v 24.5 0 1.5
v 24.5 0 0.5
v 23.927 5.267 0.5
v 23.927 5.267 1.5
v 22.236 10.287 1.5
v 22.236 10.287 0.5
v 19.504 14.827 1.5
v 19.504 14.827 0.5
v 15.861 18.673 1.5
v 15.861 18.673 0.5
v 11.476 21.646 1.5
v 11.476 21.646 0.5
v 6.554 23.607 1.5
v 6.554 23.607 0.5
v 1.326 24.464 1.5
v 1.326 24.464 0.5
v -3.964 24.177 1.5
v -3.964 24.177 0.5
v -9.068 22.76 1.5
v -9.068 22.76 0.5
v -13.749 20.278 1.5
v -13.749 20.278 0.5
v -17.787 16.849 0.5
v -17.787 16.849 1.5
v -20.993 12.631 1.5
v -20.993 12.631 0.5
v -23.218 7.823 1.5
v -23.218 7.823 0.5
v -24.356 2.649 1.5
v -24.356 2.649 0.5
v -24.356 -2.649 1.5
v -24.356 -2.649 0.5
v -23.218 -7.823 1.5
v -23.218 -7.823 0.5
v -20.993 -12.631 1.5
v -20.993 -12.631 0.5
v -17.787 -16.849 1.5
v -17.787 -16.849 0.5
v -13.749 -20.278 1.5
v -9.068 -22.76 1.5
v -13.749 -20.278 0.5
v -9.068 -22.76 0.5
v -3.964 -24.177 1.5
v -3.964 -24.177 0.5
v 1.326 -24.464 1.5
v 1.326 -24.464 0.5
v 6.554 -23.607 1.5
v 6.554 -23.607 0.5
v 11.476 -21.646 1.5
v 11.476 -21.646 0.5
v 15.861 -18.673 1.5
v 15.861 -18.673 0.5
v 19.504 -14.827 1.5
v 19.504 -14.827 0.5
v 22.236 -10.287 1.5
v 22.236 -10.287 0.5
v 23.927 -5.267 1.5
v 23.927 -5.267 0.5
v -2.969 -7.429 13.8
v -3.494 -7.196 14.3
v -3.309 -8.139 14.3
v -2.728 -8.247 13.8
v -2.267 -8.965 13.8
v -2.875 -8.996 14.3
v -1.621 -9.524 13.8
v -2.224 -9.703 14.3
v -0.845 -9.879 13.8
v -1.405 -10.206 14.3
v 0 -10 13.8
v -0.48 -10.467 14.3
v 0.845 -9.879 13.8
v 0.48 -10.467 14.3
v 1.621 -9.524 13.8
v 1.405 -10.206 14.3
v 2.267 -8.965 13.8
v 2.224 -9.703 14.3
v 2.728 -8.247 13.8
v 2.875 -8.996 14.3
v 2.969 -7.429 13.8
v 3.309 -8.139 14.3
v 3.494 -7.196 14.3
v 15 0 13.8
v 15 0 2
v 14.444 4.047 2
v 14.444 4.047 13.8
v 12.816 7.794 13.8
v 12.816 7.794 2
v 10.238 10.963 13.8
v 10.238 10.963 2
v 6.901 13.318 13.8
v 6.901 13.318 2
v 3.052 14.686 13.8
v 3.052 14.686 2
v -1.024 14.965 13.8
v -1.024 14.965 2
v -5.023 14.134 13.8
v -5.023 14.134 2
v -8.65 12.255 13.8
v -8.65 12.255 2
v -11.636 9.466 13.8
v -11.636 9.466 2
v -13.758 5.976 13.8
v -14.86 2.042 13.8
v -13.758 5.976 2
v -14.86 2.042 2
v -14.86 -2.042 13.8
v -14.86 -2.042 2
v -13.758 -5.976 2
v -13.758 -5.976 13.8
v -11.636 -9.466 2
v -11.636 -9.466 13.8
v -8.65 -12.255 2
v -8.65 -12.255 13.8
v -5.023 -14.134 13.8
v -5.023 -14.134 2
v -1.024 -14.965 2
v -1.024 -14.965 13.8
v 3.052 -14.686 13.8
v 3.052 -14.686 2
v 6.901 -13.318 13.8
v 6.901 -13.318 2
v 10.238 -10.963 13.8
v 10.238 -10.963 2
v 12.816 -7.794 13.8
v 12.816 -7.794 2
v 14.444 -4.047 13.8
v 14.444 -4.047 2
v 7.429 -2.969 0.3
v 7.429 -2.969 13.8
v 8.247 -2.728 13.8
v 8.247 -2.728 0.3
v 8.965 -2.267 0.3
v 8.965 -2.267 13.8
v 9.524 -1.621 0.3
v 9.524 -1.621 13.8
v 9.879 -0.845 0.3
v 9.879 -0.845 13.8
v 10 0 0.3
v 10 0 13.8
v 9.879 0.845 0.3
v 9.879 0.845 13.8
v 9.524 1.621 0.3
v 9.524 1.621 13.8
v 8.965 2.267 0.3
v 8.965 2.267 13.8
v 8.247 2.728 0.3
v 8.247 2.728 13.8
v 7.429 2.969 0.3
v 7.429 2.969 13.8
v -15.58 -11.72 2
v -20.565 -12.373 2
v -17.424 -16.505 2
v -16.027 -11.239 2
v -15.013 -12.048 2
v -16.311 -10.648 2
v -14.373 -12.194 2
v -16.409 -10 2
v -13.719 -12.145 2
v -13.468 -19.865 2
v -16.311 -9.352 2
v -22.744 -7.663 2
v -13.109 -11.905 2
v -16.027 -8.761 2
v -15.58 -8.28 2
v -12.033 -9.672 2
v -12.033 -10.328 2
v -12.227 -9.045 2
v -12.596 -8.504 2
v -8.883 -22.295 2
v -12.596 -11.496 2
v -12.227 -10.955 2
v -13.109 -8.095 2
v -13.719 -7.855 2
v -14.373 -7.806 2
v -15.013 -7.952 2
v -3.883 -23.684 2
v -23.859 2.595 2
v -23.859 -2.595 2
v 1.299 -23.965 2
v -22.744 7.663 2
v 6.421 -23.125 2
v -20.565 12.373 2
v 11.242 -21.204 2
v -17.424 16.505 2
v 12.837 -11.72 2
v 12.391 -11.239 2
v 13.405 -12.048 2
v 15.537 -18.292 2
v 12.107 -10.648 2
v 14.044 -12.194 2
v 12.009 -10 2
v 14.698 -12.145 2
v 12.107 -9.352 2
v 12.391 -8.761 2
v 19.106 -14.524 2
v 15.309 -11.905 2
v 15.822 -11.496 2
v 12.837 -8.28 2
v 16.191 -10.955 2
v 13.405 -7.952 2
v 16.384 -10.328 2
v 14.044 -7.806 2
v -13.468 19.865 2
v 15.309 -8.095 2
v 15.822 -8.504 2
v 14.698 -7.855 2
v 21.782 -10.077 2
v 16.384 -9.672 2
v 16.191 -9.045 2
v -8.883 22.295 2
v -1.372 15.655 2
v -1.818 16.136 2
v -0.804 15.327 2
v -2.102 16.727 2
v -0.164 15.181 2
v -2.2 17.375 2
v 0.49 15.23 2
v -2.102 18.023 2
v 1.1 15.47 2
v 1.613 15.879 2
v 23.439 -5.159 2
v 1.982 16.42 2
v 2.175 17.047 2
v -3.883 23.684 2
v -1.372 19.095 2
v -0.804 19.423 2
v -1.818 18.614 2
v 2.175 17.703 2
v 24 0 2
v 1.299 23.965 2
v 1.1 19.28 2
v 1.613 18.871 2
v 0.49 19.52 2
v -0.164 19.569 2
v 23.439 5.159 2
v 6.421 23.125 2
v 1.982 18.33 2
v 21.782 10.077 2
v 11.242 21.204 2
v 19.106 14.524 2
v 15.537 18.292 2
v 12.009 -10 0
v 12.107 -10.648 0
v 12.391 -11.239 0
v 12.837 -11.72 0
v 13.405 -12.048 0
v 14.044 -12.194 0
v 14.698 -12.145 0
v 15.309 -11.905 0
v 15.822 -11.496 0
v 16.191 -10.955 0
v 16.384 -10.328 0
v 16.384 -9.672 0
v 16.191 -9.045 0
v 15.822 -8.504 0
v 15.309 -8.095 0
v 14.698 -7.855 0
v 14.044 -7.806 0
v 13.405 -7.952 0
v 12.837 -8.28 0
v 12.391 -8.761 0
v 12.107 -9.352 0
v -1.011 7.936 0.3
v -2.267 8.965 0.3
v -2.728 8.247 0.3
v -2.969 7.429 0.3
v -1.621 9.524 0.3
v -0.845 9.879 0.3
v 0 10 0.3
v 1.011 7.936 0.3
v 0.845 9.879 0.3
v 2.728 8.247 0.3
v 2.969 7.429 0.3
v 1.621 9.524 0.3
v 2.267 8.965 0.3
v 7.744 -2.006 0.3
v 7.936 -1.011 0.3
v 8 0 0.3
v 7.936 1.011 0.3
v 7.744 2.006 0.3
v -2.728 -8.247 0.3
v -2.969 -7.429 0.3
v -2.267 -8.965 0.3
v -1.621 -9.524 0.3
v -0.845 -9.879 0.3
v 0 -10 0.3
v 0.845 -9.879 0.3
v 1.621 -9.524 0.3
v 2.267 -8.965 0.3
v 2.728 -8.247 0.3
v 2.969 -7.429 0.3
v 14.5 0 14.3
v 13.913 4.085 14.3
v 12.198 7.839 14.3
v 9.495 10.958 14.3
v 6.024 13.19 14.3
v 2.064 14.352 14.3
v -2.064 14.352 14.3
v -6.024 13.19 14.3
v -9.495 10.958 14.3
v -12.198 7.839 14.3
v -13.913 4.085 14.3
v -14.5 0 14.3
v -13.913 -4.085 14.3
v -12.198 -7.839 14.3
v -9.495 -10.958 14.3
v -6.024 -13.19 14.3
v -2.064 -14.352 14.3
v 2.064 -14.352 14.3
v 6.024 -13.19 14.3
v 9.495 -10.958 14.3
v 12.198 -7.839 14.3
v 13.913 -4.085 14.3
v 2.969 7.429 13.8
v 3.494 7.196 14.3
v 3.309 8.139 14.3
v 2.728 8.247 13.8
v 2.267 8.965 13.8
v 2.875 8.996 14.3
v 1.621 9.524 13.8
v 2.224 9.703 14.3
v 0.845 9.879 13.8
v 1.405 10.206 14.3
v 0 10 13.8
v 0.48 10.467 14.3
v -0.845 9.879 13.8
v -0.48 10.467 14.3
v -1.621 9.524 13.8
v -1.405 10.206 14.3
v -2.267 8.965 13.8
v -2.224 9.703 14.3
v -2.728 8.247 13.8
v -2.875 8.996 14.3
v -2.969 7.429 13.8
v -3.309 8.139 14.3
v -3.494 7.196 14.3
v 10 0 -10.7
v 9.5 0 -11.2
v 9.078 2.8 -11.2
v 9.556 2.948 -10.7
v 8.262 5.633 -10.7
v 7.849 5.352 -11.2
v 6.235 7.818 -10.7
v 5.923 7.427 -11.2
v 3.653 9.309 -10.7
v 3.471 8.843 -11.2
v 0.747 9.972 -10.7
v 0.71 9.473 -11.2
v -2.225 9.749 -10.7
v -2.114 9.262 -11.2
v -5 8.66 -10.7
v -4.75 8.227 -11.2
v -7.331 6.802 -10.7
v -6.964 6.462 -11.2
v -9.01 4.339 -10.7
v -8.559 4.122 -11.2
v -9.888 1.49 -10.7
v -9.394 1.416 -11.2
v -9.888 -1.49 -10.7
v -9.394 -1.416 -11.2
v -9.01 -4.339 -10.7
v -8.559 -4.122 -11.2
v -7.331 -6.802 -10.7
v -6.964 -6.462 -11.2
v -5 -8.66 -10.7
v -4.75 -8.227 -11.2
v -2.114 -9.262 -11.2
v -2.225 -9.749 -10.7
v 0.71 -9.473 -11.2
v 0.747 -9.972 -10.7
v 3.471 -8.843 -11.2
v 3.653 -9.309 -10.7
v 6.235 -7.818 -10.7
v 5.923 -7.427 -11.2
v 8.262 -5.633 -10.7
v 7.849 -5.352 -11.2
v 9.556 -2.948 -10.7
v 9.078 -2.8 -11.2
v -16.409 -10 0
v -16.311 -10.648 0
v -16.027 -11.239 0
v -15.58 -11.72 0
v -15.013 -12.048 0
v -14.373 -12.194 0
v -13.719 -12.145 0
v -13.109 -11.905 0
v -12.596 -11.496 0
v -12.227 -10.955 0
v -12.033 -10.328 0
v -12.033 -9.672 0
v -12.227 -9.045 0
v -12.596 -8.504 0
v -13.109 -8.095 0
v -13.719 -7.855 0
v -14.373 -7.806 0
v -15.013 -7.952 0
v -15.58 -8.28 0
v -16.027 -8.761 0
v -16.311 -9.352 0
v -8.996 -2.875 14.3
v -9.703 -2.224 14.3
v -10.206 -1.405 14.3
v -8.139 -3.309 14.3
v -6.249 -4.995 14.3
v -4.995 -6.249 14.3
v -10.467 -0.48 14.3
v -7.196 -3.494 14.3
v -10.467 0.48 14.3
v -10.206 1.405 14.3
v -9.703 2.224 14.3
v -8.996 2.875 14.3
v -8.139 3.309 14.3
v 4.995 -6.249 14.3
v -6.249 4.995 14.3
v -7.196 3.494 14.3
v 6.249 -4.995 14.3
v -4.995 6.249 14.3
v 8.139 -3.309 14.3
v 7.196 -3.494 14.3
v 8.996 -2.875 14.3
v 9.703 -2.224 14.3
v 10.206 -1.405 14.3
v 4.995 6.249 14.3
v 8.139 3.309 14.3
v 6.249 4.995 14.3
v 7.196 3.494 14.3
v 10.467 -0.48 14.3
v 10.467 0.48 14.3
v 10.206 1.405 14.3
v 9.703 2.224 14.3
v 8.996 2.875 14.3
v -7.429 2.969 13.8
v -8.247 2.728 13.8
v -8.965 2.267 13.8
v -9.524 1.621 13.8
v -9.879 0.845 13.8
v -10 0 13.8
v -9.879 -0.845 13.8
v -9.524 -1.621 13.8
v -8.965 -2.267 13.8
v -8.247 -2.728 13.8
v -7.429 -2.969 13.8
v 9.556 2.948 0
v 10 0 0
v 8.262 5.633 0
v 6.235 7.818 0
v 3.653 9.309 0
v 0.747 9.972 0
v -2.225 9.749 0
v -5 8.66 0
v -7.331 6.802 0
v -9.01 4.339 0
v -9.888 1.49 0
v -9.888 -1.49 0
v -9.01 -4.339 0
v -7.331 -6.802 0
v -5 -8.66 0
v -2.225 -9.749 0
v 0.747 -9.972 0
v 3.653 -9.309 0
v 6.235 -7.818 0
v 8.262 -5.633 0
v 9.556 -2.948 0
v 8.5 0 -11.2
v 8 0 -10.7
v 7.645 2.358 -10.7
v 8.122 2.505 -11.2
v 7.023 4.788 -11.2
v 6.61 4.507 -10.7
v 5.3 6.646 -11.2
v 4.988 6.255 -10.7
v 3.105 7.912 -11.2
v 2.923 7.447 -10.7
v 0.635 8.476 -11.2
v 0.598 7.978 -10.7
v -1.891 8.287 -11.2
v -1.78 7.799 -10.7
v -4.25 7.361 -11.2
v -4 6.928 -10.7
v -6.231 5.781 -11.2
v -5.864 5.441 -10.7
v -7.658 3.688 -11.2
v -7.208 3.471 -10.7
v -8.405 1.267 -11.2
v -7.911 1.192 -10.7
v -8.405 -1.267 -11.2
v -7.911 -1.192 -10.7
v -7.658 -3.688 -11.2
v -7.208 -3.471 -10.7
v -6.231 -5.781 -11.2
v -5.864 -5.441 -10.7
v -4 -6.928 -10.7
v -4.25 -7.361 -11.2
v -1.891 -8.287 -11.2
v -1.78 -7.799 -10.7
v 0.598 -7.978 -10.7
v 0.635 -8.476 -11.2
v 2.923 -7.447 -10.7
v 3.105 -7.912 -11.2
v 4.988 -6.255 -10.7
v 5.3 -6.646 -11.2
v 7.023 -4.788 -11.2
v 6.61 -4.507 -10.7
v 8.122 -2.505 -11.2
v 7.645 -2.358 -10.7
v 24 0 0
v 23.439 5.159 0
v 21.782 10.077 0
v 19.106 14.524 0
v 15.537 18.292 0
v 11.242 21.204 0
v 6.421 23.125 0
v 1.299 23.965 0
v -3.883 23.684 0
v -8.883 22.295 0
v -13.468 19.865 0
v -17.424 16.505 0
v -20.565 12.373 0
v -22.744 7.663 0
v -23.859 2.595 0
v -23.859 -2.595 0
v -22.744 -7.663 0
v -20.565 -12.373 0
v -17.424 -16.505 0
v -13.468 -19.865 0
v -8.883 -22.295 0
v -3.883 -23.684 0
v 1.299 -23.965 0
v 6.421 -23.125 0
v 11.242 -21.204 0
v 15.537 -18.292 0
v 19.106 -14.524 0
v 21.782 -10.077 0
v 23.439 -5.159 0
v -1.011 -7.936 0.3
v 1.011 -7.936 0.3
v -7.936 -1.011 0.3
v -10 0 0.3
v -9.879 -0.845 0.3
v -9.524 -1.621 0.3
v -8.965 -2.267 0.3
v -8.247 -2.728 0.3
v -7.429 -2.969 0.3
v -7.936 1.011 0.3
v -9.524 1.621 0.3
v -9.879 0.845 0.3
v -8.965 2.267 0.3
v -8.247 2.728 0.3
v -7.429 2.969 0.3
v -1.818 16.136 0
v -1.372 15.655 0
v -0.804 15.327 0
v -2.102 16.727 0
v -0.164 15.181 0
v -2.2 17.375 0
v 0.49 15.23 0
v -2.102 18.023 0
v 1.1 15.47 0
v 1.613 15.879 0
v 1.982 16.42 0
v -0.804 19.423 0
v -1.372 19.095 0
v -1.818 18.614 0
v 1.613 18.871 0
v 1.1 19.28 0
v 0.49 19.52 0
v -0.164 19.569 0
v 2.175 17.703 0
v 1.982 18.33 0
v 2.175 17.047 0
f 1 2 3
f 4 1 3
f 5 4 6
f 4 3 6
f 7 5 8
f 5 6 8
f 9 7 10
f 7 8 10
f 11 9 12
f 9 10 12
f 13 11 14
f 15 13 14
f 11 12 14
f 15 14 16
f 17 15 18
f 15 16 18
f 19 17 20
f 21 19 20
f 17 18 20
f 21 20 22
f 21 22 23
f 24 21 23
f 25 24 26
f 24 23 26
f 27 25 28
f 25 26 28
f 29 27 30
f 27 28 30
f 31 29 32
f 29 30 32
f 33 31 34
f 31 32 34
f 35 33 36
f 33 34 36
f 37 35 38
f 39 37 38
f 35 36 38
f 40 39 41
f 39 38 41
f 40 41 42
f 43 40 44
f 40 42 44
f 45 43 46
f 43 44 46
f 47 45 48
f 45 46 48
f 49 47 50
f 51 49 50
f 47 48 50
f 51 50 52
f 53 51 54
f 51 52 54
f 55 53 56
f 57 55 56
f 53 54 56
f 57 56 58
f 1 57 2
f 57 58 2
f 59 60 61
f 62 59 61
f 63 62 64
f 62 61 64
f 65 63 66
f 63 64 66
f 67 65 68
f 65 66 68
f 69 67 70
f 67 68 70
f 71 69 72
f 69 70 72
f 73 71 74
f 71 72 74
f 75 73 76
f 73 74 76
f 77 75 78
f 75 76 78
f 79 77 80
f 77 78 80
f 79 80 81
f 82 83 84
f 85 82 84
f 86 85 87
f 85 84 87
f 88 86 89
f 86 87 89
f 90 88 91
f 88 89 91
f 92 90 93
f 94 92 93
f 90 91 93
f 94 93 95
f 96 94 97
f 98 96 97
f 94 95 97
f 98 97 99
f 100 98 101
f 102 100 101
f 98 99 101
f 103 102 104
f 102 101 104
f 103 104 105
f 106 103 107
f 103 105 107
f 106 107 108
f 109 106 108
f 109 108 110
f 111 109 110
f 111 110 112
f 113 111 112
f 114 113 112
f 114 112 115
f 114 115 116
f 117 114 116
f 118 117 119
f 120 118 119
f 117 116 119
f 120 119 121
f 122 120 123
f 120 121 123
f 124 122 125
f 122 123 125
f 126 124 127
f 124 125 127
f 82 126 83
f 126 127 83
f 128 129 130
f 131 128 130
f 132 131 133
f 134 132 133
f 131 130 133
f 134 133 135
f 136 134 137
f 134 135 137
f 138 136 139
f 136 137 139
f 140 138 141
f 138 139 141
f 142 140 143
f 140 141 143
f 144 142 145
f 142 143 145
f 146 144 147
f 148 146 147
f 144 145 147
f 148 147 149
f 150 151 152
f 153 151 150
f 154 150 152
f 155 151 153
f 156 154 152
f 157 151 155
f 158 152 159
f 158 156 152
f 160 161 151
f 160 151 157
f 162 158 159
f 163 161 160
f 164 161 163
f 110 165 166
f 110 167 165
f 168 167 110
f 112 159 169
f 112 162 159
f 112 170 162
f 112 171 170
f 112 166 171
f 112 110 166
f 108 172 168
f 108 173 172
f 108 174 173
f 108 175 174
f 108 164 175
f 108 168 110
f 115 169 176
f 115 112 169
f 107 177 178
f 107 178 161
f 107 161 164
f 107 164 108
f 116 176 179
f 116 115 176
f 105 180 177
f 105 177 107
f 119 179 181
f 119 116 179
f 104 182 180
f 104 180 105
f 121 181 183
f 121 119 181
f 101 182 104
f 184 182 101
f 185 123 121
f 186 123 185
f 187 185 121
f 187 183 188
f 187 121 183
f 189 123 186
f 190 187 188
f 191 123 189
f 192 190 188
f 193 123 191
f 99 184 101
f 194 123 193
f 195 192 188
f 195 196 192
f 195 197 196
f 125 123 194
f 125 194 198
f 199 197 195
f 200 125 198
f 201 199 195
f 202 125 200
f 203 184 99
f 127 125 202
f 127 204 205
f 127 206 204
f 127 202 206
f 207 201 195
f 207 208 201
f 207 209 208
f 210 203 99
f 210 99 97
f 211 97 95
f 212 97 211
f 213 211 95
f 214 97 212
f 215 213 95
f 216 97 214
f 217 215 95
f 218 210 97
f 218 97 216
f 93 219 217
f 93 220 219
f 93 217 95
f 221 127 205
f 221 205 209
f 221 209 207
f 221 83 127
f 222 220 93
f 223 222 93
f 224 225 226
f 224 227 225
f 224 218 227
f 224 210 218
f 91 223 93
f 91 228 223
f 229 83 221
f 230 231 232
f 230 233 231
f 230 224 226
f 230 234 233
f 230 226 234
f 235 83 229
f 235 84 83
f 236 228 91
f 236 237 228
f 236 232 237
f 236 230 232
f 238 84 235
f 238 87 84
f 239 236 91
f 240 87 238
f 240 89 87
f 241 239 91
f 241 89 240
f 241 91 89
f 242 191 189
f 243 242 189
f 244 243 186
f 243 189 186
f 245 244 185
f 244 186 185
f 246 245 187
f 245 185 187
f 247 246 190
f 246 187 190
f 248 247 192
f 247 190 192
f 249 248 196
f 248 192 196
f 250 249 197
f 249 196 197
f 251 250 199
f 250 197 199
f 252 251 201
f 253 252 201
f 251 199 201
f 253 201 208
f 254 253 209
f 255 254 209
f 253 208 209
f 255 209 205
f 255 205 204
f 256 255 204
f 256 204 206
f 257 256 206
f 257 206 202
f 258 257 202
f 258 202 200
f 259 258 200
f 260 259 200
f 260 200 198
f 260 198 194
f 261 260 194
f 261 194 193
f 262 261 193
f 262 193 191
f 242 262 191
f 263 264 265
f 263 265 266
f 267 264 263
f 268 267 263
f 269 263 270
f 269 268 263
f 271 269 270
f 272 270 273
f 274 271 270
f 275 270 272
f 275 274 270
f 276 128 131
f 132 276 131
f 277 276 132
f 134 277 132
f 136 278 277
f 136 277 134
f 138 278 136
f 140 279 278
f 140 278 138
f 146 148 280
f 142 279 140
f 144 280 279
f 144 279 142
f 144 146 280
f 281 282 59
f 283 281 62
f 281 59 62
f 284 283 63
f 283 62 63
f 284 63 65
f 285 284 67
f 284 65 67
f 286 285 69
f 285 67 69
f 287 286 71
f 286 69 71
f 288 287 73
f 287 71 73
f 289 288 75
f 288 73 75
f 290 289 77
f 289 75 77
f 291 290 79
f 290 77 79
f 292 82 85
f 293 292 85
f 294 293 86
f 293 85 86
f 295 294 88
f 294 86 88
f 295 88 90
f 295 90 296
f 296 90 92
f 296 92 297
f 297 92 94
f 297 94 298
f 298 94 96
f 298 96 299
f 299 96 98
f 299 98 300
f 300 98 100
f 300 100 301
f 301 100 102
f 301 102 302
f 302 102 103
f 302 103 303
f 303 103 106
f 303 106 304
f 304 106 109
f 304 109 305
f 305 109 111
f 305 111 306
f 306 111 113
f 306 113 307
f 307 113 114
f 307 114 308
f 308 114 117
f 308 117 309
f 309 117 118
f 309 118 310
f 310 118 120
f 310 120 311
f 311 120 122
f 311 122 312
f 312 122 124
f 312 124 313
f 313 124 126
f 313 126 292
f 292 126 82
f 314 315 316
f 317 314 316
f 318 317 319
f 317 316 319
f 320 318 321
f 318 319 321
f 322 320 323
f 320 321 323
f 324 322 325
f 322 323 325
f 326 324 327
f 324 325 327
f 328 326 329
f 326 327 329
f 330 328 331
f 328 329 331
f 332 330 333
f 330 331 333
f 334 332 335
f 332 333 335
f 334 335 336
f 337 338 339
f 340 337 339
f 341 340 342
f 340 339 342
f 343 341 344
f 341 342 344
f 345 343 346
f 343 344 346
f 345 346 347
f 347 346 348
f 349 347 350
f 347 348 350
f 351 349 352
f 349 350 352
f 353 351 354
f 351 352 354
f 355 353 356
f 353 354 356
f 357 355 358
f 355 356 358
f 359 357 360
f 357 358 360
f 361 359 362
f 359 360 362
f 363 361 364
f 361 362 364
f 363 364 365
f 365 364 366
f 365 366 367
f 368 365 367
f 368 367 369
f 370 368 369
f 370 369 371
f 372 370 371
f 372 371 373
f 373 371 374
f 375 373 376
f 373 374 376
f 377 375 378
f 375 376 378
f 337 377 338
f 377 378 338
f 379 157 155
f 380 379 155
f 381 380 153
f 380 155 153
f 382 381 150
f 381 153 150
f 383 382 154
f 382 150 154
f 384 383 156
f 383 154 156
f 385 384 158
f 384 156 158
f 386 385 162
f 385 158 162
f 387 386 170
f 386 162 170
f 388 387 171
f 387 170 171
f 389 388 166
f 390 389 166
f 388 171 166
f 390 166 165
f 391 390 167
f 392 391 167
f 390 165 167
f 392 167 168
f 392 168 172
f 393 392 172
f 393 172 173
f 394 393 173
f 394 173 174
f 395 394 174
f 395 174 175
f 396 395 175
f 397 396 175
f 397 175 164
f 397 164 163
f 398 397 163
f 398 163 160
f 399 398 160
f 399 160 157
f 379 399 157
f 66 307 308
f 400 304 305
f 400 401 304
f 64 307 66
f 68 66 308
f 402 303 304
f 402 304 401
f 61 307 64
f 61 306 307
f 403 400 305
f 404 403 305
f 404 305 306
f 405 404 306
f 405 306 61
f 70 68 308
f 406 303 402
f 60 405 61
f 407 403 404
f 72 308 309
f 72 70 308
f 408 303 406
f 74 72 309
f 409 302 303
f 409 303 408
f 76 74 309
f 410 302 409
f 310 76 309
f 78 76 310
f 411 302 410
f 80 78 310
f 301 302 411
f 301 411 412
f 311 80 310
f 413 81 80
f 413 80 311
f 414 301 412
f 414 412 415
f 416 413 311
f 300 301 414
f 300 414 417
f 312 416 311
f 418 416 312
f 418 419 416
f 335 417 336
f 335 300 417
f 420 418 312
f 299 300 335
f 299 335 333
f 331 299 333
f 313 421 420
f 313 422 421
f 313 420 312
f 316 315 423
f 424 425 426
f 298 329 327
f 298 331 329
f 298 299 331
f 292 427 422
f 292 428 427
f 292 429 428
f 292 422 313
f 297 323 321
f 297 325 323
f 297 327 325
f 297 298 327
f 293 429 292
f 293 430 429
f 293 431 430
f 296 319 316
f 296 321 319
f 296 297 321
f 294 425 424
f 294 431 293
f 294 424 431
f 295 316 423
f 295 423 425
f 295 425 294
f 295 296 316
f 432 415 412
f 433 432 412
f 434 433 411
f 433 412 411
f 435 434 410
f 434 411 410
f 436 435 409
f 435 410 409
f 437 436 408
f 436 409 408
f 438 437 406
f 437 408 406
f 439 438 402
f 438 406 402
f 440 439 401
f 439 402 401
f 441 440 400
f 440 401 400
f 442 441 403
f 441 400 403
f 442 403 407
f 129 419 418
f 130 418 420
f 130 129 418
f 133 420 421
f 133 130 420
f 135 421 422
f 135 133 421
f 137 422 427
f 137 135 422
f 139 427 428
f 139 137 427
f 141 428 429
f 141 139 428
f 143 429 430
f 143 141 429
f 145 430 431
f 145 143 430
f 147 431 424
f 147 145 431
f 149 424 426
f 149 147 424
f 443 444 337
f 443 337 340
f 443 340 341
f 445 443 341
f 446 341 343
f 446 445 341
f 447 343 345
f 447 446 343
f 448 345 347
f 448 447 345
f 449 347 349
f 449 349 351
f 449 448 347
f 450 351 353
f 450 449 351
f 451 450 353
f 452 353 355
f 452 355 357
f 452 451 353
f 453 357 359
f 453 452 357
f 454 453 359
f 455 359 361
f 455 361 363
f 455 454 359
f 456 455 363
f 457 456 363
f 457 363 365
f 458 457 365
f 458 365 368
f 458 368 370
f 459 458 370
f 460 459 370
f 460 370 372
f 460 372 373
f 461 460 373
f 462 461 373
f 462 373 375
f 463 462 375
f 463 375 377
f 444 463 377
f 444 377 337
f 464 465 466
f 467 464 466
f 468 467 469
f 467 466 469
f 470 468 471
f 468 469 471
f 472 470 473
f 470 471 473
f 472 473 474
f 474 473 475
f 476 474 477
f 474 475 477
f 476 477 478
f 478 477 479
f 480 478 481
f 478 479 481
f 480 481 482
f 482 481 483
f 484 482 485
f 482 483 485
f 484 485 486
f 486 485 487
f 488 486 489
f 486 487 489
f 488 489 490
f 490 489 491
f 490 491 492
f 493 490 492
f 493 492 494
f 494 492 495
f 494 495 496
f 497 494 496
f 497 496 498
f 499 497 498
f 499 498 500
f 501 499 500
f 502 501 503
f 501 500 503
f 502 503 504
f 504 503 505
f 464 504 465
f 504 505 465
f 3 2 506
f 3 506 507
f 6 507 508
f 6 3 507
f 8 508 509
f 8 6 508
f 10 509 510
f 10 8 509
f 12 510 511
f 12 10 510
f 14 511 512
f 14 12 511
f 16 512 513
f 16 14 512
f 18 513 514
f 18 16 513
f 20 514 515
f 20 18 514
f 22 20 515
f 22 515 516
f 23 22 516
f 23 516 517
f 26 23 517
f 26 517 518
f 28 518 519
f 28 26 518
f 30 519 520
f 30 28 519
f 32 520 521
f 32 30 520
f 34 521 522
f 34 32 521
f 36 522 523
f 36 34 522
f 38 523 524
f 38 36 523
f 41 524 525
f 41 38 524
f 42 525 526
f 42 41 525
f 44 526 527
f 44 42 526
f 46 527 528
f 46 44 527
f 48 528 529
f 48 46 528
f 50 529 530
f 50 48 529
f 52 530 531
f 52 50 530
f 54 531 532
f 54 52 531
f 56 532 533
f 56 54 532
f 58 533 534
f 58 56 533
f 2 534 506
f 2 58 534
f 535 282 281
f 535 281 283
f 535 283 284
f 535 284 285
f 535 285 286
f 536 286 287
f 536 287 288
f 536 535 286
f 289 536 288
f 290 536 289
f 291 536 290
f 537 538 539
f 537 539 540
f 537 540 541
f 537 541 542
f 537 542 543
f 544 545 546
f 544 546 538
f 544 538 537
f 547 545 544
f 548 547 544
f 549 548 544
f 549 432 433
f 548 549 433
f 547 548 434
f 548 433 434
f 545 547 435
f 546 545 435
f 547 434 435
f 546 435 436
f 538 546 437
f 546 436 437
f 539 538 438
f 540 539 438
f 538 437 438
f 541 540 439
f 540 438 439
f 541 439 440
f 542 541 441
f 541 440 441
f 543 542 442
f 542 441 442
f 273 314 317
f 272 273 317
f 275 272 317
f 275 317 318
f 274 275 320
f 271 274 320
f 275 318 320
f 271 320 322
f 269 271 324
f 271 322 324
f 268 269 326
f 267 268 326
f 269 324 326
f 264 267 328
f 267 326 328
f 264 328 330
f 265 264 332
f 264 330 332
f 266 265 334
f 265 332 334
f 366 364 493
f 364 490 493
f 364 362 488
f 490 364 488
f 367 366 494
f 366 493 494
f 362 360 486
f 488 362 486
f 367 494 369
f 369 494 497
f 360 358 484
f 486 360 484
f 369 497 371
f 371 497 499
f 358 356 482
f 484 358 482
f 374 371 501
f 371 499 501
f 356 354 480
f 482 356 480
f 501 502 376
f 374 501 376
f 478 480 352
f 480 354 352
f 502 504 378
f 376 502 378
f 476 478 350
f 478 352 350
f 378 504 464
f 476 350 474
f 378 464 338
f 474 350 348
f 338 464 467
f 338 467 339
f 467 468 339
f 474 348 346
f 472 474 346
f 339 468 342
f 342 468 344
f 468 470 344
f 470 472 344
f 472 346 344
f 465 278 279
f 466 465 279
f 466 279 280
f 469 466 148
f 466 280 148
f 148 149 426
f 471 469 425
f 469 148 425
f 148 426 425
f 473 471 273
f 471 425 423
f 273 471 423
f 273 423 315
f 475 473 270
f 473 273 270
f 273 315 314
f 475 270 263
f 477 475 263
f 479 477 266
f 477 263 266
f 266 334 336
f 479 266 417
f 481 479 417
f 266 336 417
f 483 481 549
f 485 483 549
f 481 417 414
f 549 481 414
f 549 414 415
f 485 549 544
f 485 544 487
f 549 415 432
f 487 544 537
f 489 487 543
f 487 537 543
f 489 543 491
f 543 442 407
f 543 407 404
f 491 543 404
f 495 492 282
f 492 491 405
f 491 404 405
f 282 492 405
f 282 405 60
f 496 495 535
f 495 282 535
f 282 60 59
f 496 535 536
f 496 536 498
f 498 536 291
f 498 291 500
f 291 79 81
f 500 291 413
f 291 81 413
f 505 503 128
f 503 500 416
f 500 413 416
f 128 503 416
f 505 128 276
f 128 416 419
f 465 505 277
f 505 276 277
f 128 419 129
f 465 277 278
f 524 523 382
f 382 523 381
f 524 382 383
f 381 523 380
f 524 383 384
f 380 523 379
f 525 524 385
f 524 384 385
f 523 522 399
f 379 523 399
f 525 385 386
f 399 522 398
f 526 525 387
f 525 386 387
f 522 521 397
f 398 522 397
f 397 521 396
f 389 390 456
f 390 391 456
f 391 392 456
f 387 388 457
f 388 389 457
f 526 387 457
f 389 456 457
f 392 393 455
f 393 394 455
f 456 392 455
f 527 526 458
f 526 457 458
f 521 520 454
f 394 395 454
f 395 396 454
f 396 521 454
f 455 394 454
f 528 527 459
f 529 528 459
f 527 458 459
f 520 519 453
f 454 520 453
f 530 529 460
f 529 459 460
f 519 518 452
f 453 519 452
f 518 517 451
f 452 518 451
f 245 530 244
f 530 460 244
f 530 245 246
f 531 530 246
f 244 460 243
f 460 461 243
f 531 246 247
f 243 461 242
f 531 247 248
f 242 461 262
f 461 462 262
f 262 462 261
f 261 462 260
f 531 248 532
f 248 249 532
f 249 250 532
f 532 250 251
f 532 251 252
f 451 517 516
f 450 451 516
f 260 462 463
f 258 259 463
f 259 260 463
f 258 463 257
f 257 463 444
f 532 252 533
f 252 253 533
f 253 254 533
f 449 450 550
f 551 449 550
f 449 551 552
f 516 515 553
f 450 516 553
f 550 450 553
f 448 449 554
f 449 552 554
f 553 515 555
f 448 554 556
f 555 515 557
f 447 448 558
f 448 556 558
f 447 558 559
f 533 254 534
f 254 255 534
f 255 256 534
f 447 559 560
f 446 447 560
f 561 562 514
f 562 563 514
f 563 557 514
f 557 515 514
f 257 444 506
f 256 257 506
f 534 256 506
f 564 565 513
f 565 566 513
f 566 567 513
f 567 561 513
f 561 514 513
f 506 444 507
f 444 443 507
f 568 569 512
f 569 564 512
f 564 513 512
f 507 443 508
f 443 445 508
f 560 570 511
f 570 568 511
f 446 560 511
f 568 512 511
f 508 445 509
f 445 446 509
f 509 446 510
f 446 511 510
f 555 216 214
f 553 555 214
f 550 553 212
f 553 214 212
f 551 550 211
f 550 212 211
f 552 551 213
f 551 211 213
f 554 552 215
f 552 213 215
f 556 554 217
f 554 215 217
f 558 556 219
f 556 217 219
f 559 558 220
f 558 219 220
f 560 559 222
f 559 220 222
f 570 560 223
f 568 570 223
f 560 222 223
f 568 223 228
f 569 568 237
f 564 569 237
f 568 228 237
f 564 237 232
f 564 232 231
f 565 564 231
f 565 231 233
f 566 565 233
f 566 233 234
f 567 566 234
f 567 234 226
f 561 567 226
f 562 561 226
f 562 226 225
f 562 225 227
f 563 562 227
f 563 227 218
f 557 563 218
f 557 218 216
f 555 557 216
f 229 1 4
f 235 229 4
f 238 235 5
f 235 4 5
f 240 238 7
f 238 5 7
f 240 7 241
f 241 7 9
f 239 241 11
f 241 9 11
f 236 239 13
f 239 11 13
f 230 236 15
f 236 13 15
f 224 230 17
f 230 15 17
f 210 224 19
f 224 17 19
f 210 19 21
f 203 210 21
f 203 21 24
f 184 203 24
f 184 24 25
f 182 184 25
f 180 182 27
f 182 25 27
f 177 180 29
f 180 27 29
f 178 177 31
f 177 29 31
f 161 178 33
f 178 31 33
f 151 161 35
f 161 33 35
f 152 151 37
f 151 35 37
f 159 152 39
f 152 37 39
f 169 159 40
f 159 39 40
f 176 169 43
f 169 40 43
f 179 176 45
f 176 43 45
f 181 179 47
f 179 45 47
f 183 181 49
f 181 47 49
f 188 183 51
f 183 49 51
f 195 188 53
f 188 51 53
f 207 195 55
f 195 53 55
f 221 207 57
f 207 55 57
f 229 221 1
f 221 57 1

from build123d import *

# Parameters (mm, degrees)
F0_R     = 24.5
F0_R_2   = 15
F0_R_3   = 10
F1_DEPTH = 2
F2_R     = 15
F2_R_2   = 8
F3_DEPTH = 12.3
F4_R     = 10
F4_R_2   = 8
F5_DEPTH = 13.2
F6_D     = 4.4
F6_DEPTH = 14
F6_TIP   = 1.3218933619
F7_R     = 3
F8_DEPTH = 14
F9_SIZE  = 0.5
F10_SIZE = 0.5


with BuildPart() as f1:
    # F0 (on Top) → F1 (new body)
    with BuildSketch(Plane.XY):
        Circle(F0_R)
        Circle(F0_R_2, mode=Mode.SUBTRACT)
        Circle(F0_R_2)
        Circle(F0_R_3, mode=Mode.SUBTRACT)
    extrude(amount=F1_DEPTH)

    # F2 (on face) → F3 (join)
    with BuildSketch(Plane.XY.offset(2)):
        Circle(F2_R)
        Circle(F2_R_2, mode=Mode.SUBTRACT)
    extrude(amount=F3_DEPTH)

    # F4 (on face) → F5 (join)
    with BuildSketch(Plane.XY.offset(2)):
        Circle(F4_R)
        Circle(F4_R_2, mode=Mode.SUBTRACT)
    extrude(amount=-F5_DEPTH)

    # F6
    with Locations(Plane(origin=(0, 0, 0), x_dir=(1, 0, 0), z_dir=(0, 0, -1))):
        with Locations((0, -17.375), (-14.2088220835, 10), (14.2088220835, 10)):
            Hole(F6_D / 2, depth=F6_DEPTH)
            with Locations((0, 0, -(F6_DEPTH + F6_TIP / 2))):  # 118° drill point
                Cone(0, F6_D / 2, F6_TIP, mode=Mode.SUBTRACT)

    # F7 (on face) → F8 (cut)
    with BuildSketch(Plane.XY.offset(14.3)):
        with Locations((0, 7)):
            Circle(F7_R)
        with Locations((-7, 0)):
            Circle(F7_R)
        with Locations((7, 0)):
            Circle(F7_R)
        with Locations((0, -7)):
            Circle(F7_R)
    extrude(amount=-F8_DEPTH, mode=Mode.SUBTRACT)

    # F9
    f9_edges = [f1.edges().sort_by_distance(p)[0] for p in [
        (-10, 0, 14.3),
        (0, 10, 14.3),
        (10, 0, 14.3),
        (0, -10, 14.3),
        (-15, 0, 14.3),
        (-24.5, 0, 2),
        (-10, 0, -11.2),
        (-8, 0, -11.2),
    ]]
    chamfer(f9_edges, length=F9_SIZE)

    # F10
    f10_edges = [f1.edges().sort_by_distance(p)[0] for p in [
        (-24.5, 0, 0),
    ]]
    chamfer(f10_edges, length=F10_SIZE)


solid = f1.part
